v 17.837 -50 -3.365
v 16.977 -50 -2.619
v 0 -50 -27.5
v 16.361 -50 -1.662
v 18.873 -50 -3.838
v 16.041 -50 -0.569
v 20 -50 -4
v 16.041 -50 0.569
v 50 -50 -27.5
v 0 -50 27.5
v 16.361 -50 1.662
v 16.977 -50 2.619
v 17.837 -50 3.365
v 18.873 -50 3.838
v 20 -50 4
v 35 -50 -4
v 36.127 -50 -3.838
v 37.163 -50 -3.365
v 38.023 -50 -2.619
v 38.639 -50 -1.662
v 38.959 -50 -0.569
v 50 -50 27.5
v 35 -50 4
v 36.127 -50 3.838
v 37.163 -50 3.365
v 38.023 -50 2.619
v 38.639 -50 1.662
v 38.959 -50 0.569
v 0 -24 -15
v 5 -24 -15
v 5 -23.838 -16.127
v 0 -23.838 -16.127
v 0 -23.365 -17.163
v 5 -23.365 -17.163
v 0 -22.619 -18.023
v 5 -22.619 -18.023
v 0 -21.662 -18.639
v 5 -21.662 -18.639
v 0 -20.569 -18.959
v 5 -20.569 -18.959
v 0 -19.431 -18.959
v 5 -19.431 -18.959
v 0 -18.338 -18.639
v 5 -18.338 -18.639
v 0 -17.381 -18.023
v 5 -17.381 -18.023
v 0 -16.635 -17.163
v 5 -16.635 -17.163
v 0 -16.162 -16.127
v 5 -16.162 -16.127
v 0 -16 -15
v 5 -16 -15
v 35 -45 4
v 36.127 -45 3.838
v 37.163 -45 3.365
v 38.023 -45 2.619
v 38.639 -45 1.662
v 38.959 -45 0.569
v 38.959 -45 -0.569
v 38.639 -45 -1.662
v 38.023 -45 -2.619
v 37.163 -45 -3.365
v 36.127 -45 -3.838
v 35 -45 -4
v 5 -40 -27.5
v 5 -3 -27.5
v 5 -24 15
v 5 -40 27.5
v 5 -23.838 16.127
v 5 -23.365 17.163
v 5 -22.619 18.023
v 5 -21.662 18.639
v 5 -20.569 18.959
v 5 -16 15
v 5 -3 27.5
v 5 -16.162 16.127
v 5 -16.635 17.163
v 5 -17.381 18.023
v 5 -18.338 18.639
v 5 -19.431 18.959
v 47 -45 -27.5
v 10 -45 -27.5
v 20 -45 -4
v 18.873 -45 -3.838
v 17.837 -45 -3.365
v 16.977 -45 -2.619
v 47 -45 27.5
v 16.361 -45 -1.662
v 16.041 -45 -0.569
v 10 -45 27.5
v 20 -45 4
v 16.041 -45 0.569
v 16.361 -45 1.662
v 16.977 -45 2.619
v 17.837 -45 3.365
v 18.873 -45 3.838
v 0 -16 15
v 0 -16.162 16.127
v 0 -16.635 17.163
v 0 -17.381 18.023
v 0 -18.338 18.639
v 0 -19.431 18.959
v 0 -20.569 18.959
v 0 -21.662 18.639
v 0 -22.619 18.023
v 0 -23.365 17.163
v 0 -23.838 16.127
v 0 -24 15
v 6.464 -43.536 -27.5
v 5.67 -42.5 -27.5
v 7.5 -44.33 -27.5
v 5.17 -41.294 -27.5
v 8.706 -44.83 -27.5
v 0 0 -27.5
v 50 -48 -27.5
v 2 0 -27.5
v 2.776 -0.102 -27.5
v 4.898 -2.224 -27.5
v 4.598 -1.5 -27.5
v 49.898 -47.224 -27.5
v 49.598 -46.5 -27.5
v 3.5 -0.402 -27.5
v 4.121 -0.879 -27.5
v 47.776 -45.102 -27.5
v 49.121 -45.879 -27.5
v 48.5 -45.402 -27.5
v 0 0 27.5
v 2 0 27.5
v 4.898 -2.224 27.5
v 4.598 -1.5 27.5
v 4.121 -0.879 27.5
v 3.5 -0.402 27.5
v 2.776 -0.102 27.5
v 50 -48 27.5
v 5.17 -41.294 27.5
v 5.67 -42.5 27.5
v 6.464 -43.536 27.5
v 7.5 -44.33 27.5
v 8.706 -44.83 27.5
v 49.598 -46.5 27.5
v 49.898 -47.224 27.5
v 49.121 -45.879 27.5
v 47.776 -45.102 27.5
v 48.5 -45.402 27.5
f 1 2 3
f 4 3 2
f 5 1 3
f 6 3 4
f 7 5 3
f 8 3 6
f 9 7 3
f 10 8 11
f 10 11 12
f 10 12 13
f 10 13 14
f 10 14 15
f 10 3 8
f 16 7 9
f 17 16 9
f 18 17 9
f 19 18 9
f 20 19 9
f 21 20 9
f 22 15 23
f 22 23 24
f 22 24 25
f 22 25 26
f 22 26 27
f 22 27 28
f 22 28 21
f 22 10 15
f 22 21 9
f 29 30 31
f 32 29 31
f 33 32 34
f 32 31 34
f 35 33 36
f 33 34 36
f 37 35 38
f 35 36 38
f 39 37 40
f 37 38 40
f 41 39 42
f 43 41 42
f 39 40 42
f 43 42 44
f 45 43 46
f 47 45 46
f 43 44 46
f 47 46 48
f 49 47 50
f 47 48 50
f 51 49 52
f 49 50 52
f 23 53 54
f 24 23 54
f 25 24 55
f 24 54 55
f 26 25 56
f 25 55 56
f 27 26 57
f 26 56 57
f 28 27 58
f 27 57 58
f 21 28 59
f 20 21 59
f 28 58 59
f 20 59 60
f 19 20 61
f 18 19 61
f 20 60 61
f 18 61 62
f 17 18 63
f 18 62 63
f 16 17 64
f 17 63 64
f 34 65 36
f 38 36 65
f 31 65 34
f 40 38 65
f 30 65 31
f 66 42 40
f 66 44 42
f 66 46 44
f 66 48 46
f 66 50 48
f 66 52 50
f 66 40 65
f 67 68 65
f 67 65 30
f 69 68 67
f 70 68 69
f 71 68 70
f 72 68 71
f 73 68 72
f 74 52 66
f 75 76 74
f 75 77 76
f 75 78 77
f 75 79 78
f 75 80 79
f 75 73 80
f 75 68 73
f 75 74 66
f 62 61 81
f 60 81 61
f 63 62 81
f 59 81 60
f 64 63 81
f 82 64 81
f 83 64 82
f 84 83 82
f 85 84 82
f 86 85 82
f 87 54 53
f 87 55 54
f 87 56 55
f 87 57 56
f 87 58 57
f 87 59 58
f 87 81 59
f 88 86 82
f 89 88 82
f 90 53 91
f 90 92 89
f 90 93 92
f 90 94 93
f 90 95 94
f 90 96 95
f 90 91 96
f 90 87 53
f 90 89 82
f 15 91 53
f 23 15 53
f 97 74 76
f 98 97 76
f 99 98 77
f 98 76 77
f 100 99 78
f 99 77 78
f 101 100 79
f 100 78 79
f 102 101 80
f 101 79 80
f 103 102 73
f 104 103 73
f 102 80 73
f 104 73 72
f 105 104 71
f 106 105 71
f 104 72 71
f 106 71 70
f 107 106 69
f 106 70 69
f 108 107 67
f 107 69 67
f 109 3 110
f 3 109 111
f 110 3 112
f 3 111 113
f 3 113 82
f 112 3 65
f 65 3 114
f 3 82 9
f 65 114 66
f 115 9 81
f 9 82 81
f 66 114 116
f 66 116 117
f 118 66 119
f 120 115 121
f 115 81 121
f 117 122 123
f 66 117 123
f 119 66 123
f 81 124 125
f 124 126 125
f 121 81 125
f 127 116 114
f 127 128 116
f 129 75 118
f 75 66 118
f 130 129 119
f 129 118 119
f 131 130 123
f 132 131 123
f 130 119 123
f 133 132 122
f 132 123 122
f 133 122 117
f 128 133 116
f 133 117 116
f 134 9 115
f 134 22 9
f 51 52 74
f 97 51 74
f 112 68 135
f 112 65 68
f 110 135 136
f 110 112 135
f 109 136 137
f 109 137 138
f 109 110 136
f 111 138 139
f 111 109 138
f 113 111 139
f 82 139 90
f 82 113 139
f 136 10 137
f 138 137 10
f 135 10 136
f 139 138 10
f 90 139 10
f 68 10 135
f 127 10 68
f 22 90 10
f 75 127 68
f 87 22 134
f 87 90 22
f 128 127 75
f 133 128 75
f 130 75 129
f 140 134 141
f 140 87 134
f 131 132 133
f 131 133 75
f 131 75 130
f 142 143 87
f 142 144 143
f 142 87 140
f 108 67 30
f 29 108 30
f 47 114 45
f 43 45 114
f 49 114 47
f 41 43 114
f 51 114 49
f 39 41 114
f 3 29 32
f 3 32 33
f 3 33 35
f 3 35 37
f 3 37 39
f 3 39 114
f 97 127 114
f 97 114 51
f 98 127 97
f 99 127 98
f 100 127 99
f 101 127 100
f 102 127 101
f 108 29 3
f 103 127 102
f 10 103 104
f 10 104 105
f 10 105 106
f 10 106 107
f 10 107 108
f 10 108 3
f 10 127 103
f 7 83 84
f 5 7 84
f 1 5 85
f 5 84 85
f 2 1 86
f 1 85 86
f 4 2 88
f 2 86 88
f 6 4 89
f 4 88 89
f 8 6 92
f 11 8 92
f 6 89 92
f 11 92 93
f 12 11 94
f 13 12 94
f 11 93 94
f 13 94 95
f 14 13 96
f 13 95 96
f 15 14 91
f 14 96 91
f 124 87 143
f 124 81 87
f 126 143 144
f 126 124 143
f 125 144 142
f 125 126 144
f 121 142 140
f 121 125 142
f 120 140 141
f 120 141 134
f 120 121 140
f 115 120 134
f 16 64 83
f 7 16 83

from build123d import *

# Parameters (mm, degrees)
F1_DEPTH = 27.5
F2_R     = 5
F3_R     = 3
F5_DEPTH = 5.001
F7_DEPTH = 5.001


with BuildPart() as f1:
    # F0 (on Top) → F1 (new body, symmetric)
    with BuildSketch(Plane.XY):
        Polygon((5, 0), (0, 0), (0, -50), (50, -50), (50, -45), (5, -45), align=None)
    extrude(amount=F1_DEPTH, both=True)

    # F2
    f2_edges = [f1.edges().sort_by_distance(p)[0] for p in [
        (5, -45, 0),
    ]]
    fillet(f2_edges, radius=F2_R)

    # F3
    f3_edges = [f1.edges().sort_by_distance(p)[0] for p in [
        (5, 0, 0),
        (50, -45, 0),
    ]]
    fillet(f3_edges, radius=F3_R)

    # F4 (on face) → F5 (cut, through all)
    with BuildSketch(Plane.YZ.offset(5)):
        with BuildLine():
            ThreePointArc((-16, 15), (-20, 19), (-24, 15))
            Line((-24, 15), (-24, -15))
            ThreePointArc((-24, -15), (-20, -19), (-16, -15))
            Line((-16, -15), (-16, 15))
        make_face()
    extrude(amount=-F5_DEPTH, mode=Mode.SUBTRACT)

    # F6 (on face) → F7 (cut, through all)
    with BuildSketch(Plane(origin=(0, -45, 0), x_dir=(-1, 0, 0), z_dir=(0, 1, 0))):
        with BuildLine():
            Line((-20, 4), (-35, 4))
            ThreePointArc((-35, 4), (-39, 0), (-35, -4))
            Line((-35, -4), (-20, -4))
            ThreePointArc((-20, -4), (-16, 0), (-20, 4))
        make_face()
    extrude(amount=-F7_DEPTH, mode=Mode.SUBTRACT)


solid = f1.part
